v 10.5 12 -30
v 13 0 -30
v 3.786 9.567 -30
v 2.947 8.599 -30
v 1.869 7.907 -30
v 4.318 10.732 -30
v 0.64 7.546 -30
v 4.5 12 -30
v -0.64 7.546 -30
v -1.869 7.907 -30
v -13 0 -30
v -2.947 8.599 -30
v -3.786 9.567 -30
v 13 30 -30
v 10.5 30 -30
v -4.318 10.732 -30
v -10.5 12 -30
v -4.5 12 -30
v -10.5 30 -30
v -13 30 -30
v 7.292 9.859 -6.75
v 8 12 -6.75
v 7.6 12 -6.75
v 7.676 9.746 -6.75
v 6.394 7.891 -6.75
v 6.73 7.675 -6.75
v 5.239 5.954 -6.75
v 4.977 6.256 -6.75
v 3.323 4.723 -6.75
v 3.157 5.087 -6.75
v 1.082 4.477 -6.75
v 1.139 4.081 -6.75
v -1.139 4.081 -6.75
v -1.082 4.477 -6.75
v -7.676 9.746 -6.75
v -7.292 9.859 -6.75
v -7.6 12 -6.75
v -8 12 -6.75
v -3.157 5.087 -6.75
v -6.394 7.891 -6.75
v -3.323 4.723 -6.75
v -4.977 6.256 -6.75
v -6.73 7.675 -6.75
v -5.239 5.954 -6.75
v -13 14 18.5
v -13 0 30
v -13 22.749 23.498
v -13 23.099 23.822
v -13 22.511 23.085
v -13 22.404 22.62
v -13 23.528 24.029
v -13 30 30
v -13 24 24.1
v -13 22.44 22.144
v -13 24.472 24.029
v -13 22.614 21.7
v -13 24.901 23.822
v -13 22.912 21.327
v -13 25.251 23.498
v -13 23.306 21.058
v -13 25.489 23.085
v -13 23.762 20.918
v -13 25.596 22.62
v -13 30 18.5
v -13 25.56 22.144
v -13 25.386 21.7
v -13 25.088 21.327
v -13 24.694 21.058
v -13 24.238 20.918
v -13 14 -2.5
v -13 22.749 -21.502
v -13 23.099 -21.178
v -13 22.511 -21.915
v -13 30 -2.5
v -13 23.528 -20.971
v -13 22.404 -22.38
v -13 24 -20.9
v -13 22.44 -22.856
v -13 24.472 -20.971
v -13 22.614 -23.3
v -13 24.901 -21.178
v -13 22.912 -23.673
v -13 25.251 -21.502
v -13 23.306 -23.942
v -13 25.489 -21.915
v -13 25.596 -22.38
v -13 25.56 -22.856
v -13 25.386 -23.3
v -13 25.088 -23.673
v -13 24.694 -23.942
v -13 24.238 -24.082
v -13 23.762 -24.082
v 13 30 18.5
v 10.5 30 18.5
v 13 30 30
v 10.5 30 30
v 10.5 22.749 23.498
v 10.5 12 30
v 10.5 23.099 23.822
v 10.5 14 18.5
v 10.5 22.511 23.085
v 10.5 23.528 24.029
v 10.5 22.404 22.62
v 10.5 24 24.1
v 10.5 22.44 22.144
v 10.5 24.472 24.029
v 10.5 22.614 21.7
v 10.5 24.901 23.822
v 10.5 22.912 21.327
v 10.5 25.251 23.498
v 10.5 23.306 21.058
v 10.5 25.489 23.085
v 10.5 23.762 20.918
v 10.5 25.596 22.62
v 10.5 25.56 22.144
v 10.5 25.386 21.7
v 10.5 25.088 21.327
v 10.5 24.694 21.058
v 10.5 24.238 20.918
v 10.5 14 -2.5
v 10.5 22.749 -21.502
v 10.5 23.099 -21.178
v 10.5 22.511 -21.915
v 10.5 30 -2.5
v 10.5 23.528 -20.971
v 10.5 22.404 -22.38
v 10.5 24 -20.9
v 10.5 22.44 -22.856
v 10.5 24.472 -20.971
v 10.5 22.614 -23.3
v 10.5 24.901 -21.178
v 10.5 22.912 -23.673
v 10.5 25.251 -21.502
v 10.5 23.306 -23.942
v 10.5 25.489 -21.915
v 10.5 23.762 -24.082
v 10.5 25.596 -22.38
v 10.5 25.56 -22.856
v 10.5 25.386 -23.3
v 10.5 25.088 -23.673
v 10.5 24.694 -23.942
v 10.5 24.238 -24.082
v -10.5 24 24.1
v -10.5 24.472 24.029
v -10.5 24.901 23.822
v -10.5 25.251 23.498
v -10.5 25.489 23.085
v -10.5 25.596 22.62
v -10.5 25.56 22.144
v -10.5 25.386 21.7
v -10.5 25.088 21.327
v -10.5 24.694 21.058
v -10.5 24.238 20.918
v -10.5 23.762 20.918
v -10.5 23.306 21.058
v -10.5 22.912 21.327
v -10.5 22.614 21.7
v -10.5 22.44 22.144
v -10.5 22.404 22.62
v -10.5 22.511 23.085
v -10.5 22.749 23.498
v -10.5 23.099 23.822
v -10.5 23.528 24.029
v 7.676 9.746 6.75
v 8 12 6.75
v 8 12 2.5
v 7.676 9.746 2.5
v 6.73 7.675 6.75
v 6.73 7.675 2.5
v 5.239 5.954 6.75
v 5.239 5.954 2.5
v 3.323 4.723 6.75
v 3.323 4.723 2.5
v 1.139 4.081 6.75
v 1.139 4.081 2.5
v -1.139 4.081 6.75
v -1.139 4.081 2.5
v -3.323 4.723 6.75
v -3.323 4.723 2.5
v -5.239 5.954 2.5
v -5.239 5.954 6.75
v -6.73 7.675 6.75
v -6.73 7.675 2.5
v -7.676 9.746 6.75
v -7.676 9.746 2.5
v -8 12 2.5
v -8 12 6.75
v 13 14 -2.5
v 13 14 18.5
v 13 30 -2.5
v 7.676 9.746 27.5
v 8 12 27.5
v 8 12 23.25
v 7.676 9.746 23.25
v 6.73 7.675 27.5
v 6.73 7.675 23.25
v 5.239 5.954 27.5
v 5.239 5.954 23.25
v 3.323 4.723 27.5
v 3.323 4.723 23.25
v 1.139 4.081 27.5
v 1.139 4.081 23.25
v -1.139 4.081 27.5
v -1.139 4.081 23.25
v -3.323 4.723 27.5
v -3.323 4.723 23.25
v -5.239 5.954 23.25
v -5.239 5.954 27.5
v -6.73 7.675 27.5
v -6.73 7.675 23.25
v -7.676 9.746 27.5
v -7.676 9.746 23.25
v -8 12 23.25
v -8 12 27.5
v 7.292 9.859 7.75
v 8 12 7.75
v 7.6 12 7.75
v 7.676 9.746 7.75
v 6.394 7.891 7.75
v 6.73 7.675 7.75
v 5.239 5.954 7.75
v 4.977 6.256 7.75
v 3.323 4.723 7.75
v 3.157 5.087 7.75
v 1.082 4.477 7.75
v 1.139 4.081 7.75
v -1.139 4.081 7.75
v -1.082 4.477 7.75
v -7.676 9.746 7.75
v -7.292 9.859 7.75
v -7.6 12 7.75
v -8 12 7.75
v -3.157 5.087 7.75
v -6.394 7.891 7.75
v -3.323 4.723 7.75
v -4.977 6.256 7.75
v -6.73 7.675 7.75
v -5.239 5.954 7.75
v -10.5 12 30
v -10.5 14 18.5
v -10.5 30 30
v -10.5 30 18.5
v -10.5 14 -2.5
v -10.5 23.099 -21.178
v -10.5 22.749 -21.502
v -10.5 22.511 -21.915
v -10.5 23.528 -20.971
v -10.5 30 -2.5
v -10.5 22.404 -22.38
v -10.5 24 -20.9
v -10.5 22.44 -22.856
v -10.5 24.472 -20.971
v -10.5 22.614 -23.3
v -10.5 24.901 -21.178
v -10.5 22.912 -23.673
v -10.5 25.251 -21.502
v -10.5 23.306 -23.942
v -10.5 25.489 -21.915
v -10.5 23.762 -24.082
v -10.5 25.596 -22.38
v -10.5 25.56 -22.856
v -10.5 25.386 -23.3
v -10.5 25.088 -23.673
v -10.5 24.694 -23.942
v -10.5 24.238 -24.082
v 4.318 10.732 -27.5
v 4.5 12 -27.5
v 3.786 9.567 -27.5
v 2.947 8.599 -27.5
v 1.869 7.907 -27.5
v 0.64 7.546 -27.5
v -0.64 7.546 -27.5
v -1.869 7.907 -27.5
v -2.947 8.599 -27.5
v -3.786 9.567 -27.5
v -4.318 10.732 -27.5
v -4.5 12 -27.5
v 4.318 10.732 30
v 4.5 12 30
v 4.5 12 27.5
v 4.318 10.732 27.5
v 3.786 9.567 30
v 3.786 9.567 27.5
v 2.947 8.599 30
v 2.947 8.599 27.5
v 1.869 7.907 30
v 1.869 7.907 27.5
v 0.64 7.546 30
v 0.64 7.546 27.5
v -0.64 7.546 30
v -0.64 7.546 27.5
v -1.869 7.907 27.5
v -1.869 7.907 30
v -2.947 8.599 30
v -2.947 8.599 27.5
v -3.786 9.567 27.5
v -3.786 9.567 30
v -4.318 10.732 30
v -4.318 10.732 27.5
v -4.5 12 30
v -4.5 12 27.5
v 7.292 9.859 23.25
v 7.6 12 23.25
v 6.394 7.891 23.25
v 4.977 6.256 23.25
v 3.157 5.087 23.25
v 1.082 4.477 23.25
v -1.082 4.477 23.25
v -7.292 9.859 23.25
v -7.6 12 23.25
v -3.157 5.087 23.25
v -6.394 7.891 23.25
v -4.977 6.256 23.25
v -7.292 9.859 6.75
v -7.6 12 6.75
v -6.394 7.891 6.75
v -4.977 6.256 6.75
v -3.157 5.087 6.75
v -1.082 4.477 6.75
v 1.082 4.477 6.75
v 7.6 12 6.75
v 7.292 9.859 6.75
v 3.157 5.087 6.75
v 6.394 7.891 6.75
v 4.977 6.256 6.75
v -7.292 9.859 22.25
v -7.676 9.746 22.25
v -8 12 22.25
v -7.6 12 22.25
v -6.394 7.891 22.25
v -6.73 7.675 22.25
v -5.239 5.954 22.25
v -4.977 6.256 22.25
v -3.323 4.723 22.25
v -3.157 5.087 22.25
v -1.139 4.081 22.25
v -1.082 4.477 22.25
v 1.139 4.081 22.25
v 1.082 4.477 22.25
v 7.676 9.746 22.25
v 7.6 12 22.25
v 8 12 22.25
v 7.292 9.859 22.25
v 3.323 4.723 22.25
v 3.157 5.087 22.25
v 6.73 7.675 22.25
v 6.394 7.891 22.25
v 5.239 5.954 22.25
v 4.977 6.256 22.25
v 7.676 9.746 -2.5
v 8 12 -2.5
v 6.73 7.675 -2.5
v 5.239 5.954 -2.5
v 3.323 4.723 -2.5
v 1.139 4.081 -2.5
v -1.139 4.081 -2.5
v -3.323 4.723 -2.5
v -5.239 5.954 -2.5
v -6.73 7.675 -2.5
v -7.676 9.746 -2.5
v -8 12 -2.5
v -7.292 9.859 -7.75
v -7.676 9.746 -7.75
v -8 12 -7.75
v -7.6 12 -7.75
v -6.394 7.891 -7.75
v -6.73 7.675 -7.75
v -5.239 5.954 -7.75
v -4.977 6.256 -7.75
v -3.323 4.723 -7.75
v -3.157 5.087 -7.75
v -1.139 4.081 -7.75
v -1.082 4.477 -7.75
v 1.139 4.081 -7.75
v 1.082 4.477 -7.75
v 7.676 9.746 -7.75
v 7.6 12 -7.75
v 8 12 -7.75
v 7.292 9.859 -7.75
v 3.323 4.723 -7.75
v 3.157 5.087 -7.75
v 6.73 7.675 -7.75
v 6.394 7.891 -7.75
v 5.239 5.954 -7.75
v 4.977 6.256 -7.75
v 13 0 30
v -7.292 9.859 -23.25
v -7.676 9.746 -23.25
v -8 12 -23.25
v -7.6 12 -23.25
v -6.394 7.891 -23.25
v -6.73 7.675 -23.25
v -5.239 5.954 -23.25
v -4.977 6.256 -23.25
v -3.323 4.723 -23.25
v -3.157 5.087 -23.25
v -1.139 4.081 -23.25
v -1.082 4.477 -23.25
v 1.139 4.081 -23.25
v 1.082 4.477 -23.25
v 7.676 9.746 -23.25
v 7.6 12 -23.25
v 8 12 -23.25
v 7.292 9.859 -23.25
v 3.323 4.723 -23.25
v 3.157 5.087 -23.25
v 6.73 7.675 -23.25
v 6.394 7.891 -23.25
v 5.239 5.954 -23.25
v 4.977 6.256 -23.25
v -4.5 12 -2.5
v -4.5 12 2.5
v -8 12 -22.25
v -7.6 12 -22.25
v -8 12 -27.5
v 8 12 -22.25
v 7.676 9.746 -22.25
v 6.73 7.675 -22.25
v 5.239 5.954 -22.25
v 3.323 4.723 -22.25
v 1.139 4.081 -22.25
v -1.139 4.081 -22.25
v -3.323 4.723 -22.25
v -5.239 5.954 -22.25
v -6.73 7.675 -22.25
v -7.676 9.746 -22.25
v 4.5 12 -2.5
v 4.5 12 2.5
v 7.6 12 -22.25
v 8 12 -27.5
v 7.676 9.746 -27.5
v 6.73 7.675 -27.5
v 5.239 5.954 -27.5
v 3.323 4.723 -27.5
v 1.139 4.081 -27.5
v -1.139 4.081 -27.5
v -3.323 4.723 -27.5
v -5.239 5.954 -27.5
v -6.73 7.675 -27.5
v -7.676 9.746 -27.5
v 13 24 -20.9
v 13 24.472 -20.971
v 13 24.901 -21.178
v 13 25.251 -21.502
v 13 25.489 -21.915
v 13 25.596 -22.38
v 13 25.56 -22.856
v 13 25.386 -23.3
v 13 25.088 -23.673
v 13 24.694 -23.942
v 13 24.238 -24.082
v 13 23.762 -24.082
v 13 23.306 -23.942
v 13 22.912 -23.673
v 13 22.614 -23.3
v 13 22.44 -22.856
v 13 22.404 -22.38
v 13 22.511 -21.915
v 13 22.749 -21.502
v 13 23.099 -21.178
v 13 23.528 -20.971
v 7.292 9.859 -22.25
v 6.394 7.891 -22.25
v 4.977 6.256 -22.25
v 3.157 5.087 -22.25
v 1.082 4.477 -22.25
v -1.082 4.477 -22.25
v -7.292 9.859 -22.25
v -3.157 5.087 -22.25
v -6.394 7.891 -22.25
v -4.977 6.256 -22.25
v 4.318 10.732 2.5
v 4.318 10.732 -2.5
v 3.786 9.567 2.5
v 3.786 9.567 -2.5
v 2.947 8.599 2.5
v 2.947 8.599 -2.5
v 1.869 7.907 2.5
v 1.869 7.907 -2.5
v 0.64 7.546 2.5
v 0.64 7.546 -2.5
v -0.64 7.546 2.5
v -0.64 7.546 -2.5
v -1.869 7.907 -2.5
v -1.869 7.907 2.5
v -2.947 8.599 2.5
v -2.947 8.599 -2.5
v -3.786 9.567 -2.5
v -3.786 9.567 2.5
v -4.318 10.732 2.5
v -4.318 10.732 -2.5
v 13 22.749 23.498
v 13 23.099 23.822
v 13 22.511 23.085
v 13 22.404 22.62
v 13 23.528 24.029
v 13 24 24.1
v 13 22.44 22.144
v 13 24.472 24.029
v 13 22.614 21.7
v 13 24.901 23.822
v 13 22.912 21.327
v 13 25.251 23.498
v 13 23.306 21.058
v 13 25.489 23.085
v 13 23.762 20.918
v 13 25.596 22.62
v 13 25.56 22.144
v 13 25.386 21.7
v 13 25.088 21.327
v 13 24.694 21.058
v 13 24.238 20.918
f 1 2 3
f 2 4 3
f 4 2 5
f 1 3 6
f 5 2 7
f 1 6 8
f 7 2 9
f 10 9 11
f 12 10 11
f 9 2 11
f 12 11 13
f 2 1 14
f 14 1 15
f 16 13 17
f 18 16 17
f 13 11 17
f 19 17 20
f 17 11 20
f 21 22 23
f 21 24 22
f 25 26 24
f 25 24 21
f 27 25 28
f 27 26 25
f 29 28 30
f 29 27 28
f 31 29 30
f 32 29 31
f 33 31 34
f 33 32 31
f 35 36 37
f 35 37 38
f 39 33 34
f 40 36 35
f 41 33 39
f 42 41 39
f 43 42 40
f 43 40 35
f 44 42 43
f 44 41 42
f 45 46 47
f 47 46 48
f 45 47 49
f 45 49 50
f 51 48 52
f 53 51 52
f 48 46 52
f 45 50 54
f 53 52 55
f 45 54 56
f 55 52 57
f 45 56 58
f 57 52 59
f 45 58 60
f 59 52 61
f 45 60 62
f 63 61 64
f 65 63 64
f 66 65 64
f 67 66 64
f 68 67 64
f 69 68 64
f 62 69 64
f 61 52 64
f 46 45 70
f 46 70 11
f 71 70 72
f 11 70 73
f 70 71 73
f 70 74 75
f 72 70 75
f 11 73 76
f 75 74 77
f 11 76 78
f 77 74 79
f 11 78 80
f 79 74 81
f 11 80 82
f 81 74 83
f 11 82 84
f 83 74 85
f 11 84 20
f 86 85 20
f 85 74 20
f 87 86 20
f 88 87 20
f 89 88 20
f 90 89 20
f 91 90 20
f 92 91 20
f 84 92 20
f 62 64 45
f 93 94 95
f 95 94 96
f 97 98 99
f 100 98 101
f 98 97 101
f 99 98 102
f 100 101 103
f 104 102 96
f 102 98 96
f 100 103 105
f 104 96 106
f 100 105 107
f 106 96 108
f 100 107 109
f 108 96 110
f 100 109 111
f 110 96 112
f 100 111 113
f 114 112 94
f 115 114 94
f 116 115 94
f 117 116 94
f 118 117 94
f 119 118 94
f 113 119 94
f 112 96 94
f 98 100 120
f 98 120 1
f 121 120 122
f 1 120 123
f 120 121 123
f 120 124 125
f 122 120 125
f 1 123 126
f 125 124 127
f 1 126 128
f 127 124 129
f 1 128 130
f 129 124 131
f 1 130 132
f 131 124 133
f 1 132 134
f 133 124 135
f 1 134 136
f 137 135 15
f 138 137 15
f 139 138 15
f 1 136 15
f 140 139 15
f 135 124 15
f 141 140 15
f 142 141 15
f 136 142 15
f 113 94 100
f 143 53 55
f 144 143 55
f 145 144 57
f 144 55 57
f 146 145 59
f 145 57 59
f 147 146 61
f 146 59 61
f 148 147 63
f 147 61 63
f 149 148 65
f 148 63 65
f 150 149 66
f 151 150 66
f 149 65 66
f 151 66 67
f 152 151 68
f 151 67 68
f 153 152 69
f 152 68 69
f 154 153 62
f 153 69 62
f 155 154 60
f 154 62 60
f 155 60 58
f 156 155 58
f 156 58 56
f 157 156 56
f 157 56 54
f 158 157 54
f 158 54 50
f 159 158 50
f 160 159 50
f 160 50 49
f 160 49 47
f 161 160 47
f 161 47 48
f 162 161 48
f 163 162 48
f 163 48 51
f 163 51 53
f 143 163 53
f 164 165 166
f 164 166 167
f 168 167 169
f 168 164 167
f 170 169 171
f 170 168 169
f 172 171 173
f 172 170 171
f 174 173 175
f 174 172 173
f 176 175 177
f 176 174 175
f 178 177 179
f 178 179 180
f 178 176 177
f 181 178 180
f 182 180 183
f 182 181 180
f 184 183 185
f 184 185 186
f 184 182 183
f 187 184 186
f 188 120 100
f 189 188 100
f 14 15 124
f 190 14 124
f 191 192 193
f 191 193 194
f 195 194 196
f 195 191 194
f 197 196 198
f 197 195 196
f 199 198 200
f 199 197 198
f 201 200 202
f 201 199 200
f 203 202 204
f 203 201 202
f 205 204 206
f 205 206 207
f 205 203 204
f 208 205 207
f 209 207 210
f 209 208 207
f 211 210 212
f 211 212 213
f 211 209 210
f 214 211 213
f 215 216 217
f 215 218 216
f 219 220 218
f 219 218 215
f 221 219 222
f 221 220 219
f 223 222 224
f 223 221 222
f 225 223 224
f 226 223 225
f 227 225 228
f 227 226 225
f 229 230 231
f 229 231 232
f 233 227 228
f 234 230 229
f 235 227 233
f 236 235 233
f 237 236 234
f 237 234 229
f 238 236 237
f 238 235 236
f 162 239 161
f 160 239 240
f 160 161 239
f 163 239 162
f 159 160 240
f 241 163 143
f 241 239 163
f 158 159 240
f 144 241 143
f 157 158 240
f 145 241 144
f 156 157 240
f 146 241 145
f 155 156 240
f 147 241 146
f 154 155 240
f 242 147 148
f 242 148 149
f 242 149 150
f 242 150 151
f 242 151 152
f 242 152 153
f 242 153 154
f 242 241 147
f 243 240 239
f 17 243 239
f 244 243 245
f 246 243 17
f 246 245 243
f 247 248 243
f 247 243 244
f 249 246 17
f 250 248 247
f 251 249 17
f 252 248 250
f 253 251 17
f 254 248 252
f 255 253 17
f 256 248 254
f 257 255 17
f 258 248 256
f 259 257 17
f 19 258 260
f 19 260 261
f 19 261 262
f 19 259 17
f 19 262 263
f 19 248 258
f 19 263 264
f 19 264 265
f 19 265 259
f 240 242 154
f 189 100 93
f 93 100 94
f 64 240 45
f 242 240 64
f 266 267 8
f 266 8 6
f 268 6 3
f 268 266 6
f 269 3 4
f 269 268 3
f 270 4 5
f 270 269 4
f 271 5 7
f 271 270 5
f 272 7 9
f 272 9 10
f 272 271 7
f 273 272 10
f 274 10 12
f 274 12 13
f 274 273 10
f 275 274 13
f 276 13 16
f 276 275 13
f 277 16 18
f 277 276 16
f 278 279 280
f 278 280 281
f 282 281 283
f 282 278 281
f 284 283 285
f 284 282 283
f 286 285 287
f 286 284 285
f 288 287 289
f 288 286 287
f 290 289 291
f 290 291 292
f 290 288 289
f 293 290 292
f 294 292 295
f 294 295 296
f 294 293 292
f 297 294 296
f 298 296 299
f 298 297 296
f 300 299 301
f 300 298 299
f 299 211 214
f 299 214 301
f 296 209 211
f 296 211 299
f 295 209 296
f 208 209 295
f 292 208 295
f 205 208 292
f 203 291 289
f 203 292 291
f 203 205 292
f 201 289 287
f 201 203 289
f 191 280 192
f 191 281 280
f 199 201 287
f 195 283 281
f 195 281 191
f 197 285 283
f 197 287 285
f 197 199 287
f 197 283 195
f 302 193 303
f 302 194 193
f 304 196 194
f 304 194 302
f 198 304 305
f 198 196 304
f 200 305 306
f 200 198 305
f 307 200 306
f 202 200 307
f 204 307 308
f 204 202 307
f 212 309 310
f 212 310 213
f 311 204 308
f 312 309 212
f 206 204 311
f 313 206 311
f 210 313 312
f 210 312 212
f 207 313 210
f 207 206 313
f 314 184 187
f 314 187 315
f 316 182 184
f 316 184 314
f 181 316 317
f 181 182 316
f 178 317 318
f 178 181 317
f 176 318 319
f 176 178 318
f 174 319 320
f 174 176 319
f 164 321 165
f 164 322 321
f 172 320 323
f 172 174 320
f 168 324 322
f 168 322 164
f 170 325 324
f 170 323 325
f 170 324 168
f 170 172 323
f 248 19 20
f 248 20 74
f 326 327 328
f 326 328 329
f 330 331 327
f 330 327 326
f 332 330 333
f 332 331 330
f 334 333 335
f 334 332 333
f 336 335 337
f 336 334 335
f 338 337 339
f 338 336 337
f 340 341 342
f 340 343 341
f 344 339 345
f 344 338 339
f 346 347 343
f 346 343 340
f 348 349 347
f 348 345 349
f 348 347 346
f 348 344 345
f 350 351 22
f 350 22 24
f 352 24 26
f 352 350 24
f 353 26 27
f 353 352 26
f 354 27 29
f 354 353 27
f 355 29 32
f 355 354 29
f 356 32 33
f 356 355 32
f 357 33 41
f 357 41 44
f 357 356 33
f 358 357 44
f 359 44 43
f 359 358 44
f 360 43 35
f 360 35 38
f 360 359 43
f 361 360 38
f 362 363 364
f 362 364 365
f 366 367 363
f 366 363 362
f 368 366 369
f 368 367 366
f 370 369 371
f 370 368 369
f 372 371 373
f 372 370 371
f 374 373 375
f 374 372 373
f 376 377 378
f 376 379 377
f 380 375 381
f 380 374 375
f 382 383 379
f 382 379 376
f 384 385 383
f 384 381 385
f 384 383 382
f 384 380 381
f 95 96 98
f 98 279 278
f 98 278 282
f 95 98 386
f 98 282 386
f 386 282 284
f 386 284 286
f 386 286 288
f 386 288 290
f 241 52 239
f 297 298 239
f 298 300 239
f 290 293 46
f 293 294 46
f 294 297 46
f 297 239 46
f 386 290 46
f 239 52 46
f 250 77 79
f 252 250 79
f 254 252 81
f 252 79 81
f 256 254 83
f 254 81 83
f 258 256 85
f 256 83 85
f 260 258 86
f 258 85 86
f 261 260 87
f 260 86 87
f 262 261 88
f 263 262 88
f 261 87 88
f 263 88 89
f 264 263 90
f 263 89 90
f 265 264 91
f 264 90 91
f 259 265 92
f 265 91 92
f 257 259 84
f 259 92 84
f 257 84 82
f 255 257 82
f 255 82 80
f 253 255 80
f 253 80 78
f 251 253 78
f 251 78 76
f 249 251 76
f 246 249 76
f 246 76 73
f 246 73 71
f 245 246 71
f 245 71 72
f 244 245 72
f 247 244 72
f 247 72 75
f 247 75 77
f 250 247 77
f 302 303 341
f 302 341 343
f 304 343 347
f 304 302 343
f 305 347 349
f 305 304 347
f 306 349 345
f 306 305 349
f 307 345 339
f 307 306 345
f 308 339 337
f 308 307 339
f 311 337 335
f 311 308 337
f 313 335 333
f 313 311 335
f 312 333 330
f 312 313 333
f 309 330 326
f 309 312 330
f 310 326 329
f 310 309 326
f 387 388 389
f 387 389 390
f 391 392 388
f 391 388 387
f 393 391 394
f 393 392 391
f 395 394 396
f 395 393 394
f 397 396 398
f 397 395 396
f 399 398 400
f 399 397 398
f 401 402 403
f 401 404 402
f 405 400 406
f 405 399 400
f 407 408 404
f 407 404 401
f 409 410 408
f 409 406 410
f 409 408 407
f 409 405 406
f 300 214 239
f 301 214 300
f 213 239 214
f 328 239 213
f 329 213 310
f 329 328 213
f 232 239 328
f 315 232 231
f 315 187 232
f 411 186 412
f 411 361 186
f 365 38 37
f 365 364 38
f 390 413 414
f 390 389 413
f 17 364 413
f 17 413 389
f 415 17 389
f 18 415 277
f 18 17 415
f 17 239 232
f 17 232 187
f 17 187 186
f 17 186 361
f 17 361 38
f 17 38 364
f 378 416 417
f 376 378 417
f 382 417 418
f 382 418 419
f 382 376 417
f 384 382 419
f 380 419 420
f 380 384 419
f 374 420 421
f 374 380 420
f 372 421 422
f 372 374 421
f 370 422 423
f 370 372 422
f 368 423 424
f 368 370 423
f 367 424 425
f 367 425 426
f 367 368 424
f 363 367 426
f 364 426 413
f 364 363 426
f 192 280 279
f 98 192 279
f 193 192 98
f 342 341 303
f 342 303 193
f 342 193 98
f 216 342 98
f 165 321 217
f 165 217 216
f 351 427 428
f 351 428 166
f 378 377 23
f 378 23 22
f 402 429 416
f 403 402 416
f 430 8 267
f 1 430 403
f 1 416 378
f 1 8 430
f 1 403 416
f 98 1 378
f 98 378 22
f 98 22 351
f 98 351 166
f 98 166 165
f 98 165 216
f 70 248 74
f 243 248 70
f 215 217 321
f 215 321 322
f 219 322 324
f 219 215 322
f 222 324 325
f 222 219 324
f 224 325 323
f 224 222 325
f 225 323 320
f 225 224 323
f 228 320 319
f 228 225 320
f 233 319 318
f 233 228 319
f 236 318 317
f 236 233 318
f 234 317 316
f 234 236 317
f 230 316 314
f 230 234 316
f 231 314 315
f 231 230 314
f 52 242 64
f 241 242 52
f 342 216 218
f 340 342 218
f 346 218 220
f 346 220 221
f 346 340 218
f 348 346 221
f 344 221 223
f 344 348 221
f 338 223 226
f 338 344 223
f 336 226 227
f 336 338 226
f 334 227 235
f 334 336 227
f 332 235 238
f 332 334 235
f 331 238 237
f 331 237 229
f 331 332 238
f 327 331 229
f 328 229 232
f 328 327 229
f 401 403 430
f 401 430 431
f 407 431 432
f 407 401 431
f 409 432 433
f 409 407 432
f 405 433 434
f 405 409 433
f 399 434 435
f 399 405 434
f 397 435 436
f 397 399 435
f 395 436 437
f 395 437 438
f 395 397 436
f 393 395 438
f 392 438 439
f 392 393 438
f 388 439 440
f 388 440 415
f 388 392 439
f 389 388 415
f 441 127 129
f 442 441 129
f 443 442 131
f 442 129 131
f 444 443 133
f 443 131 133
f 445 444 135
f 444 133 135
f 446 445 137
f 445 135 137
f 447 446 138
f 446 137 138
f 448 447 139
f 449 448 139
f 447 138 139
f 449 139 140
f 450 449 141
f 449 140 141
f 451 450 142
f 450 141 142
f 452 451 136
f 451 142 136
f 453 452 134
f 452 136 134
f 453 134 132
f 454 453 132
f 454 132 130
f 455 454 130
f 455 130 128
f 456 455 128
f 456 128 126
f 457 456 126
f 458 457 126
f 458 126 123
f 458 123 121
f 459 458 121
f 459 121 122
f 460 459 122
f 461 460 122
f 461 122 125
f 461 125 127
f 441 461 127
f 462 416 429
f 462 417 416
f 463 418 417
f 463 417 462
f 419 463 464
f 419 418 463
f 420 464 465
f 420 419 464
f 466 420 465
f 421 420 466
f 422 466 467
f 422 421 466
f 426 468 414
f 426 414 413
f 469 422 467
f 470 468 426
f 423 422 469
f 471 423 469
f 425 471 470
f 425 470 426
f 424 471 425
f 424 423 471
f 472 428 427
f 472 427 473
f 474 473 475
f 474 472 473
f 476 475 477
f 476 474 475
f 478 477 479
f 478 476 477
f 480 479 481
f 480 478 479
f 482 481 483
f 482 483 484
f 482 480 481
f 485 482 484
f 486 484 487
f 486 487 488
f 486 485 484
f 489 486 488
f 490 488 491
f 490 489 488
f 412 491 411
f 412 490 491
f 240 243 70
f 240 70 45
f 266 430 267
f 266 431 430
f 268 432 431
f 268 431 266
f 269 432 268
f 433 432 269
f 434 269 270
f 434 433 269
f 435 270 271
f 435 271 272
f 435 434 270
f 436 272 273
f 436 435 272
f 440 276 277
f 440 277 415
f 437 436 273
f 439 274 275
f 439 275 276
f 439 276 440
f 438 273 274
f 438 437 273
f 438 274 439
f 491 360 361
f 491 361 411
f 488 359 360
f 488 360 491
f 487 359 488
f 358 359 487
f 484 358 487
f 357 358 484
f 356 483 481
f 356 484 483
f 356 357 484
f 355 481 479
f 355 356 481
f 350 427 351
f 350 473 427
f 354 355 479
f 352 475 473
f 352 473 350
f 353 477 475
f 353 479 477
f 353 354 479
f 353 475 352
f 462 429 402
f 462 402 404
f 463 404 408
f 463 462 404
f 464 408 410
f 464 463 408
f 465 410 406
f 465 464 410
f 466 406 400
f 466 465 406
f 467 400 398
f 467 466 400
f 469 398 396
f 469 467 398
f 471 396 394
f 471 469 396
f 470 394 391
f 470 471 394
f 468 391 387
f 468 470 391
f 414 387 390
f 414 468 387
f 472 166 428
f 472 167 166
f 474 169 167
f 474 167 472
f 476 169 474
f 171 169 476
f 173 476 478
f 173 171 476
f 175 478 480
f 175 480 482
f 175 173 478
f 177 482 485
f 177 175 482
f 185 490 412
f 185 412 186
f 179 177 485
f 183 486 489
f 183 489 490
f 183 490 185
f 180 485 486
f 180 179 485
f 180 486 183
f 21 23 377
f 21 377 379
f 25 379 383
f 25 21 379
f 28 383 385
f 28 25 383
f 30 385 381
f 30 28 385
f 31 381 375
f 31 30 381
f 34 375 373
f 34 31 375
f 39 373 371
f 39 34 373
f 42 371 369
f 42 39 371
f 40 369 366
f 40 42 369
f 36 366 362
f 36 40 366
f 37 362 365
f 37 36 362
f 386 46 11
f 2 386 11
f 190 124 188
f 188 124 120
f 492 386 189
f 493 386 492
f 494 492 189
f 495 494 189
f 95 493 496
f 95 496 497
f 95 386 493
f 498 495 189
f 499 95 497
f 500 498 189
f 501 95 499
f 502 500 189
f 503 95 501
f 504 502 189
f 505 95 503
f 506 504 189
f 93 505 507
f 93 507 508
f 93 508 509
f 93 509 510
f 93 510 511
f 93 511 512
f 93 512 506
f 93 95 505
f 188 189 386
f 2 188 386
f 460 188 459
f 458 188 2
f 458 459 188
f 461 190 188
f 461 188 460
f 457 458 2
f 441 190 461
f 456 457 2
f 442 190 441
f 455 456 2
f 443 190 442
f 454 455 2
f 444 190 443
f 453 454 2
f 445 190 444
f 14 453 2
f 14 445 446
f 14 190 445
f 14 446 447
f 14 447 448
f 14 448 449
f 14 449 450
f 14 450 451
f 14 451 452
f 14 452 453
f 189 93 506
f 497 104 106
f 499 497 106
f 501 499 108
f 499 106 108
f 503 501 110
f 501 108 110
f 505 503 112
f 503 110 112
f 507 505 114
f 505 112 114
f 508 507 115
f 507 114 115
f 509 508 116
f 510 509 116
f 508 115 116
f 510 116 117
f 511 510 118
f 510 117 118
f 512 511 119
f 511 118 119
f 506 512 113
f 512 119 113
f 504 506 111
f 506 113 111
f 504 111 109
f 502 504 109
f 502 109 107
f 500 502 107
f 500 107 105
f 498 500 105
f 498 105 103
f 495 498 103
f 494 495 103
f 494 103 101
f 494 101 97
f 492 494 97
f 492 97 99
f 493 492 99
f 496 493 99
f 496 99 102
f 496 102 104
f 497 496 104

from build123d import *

# Parameters (mm, degrees)
SKETCH1_W           = 21
SKETCH1_H           = 60
BOSS_EXTRUDE1_DEPTH = 12
BOSS_EXTRUDE2_DEPTH = 2.5
SKETCH7_R           = 1.6
CUT_EXTRUDE2_DEPTH  = 50.759421218


with BuildPart() as part:
    # Sketch1 → Boss-Extrude1 (new body)
    with BuildSketch(Plane(origin=(0, 0, 0), x_dir=(1, 0, 0), z_dir=(0, 1, 0))):
        Rectangle(SKETCH1_W, SKETCH1_H)
    extrude(amount=BOSS_EXTRUDE1_DEPTH)

    # Sketch2 → Cut-Revolve1 (revolve, cut)
    with BuildSketch(Plane(origin=(0, 12, 0), x_dir=(1, 0, 0), z_dir=(0, 1, 0))):
        Polygon((0, 30), (4.5, 30), (4.5, 27.5), (8, 27.5), (8, 23.25), (7.6, 23.25), (7.6, 22.25), (8, 22.25), (8, 7.75), (7.6, 7.75), (7.6, 6.75), (8, 6.75), (8, 2.5), (4.5, 2.5), (4.5, -2.5), (8, -2.5), (8, -6.75), (7.6, -6.75), (7.6, -7.75), (8, -7.75), (8, -22.25), (7.6, -22.25), (7.6, -23.25), (8, -23.25), (8, -27.5), (4.5, -27.5), (4.5, -30), (0, -30), align=None)
    revolve(axis=Axis((0, 12, 32.783592288), (0, 0, -1)), mode=Mode.SUBTRACT)

    # Sketch3 → Boss-Extrude2 (add)
    with BuildSketch(Plane.ZY.offset(10.5)):
        Polygon((-30, 0), (-30, 30), (-2.5, 30), (-2.5, 14), (18.5, 14), (18.5, 30), (30, 30), (30, 0), align=None)
    boss_extrude2 = extrude(amount=BOSS_EXTRUDE2_DEPTH)

    # Mirror2: Boss-Extrude2 across plane
    add(boss_extrude2.mirror(Plane(origin=(0, 0, 0), x_dir=(0, 0, 1), z_dir=(1, 0, 0))))

    # Sketch7 → Cut-Extrude2 (cut, through all)
    with BuildSketch(Plane.ZY.offset(13)):
        with Locations((22.5, 24)):
            Circle(SKETCH7_R)
        with Locations((-22.5, 24)):
            Circle(SKETCH7_R)
    extrude(amount=-CUT_EXTRUDE2_DEPTH, mode=Mode.SUBTRACT)


solid = part.part
